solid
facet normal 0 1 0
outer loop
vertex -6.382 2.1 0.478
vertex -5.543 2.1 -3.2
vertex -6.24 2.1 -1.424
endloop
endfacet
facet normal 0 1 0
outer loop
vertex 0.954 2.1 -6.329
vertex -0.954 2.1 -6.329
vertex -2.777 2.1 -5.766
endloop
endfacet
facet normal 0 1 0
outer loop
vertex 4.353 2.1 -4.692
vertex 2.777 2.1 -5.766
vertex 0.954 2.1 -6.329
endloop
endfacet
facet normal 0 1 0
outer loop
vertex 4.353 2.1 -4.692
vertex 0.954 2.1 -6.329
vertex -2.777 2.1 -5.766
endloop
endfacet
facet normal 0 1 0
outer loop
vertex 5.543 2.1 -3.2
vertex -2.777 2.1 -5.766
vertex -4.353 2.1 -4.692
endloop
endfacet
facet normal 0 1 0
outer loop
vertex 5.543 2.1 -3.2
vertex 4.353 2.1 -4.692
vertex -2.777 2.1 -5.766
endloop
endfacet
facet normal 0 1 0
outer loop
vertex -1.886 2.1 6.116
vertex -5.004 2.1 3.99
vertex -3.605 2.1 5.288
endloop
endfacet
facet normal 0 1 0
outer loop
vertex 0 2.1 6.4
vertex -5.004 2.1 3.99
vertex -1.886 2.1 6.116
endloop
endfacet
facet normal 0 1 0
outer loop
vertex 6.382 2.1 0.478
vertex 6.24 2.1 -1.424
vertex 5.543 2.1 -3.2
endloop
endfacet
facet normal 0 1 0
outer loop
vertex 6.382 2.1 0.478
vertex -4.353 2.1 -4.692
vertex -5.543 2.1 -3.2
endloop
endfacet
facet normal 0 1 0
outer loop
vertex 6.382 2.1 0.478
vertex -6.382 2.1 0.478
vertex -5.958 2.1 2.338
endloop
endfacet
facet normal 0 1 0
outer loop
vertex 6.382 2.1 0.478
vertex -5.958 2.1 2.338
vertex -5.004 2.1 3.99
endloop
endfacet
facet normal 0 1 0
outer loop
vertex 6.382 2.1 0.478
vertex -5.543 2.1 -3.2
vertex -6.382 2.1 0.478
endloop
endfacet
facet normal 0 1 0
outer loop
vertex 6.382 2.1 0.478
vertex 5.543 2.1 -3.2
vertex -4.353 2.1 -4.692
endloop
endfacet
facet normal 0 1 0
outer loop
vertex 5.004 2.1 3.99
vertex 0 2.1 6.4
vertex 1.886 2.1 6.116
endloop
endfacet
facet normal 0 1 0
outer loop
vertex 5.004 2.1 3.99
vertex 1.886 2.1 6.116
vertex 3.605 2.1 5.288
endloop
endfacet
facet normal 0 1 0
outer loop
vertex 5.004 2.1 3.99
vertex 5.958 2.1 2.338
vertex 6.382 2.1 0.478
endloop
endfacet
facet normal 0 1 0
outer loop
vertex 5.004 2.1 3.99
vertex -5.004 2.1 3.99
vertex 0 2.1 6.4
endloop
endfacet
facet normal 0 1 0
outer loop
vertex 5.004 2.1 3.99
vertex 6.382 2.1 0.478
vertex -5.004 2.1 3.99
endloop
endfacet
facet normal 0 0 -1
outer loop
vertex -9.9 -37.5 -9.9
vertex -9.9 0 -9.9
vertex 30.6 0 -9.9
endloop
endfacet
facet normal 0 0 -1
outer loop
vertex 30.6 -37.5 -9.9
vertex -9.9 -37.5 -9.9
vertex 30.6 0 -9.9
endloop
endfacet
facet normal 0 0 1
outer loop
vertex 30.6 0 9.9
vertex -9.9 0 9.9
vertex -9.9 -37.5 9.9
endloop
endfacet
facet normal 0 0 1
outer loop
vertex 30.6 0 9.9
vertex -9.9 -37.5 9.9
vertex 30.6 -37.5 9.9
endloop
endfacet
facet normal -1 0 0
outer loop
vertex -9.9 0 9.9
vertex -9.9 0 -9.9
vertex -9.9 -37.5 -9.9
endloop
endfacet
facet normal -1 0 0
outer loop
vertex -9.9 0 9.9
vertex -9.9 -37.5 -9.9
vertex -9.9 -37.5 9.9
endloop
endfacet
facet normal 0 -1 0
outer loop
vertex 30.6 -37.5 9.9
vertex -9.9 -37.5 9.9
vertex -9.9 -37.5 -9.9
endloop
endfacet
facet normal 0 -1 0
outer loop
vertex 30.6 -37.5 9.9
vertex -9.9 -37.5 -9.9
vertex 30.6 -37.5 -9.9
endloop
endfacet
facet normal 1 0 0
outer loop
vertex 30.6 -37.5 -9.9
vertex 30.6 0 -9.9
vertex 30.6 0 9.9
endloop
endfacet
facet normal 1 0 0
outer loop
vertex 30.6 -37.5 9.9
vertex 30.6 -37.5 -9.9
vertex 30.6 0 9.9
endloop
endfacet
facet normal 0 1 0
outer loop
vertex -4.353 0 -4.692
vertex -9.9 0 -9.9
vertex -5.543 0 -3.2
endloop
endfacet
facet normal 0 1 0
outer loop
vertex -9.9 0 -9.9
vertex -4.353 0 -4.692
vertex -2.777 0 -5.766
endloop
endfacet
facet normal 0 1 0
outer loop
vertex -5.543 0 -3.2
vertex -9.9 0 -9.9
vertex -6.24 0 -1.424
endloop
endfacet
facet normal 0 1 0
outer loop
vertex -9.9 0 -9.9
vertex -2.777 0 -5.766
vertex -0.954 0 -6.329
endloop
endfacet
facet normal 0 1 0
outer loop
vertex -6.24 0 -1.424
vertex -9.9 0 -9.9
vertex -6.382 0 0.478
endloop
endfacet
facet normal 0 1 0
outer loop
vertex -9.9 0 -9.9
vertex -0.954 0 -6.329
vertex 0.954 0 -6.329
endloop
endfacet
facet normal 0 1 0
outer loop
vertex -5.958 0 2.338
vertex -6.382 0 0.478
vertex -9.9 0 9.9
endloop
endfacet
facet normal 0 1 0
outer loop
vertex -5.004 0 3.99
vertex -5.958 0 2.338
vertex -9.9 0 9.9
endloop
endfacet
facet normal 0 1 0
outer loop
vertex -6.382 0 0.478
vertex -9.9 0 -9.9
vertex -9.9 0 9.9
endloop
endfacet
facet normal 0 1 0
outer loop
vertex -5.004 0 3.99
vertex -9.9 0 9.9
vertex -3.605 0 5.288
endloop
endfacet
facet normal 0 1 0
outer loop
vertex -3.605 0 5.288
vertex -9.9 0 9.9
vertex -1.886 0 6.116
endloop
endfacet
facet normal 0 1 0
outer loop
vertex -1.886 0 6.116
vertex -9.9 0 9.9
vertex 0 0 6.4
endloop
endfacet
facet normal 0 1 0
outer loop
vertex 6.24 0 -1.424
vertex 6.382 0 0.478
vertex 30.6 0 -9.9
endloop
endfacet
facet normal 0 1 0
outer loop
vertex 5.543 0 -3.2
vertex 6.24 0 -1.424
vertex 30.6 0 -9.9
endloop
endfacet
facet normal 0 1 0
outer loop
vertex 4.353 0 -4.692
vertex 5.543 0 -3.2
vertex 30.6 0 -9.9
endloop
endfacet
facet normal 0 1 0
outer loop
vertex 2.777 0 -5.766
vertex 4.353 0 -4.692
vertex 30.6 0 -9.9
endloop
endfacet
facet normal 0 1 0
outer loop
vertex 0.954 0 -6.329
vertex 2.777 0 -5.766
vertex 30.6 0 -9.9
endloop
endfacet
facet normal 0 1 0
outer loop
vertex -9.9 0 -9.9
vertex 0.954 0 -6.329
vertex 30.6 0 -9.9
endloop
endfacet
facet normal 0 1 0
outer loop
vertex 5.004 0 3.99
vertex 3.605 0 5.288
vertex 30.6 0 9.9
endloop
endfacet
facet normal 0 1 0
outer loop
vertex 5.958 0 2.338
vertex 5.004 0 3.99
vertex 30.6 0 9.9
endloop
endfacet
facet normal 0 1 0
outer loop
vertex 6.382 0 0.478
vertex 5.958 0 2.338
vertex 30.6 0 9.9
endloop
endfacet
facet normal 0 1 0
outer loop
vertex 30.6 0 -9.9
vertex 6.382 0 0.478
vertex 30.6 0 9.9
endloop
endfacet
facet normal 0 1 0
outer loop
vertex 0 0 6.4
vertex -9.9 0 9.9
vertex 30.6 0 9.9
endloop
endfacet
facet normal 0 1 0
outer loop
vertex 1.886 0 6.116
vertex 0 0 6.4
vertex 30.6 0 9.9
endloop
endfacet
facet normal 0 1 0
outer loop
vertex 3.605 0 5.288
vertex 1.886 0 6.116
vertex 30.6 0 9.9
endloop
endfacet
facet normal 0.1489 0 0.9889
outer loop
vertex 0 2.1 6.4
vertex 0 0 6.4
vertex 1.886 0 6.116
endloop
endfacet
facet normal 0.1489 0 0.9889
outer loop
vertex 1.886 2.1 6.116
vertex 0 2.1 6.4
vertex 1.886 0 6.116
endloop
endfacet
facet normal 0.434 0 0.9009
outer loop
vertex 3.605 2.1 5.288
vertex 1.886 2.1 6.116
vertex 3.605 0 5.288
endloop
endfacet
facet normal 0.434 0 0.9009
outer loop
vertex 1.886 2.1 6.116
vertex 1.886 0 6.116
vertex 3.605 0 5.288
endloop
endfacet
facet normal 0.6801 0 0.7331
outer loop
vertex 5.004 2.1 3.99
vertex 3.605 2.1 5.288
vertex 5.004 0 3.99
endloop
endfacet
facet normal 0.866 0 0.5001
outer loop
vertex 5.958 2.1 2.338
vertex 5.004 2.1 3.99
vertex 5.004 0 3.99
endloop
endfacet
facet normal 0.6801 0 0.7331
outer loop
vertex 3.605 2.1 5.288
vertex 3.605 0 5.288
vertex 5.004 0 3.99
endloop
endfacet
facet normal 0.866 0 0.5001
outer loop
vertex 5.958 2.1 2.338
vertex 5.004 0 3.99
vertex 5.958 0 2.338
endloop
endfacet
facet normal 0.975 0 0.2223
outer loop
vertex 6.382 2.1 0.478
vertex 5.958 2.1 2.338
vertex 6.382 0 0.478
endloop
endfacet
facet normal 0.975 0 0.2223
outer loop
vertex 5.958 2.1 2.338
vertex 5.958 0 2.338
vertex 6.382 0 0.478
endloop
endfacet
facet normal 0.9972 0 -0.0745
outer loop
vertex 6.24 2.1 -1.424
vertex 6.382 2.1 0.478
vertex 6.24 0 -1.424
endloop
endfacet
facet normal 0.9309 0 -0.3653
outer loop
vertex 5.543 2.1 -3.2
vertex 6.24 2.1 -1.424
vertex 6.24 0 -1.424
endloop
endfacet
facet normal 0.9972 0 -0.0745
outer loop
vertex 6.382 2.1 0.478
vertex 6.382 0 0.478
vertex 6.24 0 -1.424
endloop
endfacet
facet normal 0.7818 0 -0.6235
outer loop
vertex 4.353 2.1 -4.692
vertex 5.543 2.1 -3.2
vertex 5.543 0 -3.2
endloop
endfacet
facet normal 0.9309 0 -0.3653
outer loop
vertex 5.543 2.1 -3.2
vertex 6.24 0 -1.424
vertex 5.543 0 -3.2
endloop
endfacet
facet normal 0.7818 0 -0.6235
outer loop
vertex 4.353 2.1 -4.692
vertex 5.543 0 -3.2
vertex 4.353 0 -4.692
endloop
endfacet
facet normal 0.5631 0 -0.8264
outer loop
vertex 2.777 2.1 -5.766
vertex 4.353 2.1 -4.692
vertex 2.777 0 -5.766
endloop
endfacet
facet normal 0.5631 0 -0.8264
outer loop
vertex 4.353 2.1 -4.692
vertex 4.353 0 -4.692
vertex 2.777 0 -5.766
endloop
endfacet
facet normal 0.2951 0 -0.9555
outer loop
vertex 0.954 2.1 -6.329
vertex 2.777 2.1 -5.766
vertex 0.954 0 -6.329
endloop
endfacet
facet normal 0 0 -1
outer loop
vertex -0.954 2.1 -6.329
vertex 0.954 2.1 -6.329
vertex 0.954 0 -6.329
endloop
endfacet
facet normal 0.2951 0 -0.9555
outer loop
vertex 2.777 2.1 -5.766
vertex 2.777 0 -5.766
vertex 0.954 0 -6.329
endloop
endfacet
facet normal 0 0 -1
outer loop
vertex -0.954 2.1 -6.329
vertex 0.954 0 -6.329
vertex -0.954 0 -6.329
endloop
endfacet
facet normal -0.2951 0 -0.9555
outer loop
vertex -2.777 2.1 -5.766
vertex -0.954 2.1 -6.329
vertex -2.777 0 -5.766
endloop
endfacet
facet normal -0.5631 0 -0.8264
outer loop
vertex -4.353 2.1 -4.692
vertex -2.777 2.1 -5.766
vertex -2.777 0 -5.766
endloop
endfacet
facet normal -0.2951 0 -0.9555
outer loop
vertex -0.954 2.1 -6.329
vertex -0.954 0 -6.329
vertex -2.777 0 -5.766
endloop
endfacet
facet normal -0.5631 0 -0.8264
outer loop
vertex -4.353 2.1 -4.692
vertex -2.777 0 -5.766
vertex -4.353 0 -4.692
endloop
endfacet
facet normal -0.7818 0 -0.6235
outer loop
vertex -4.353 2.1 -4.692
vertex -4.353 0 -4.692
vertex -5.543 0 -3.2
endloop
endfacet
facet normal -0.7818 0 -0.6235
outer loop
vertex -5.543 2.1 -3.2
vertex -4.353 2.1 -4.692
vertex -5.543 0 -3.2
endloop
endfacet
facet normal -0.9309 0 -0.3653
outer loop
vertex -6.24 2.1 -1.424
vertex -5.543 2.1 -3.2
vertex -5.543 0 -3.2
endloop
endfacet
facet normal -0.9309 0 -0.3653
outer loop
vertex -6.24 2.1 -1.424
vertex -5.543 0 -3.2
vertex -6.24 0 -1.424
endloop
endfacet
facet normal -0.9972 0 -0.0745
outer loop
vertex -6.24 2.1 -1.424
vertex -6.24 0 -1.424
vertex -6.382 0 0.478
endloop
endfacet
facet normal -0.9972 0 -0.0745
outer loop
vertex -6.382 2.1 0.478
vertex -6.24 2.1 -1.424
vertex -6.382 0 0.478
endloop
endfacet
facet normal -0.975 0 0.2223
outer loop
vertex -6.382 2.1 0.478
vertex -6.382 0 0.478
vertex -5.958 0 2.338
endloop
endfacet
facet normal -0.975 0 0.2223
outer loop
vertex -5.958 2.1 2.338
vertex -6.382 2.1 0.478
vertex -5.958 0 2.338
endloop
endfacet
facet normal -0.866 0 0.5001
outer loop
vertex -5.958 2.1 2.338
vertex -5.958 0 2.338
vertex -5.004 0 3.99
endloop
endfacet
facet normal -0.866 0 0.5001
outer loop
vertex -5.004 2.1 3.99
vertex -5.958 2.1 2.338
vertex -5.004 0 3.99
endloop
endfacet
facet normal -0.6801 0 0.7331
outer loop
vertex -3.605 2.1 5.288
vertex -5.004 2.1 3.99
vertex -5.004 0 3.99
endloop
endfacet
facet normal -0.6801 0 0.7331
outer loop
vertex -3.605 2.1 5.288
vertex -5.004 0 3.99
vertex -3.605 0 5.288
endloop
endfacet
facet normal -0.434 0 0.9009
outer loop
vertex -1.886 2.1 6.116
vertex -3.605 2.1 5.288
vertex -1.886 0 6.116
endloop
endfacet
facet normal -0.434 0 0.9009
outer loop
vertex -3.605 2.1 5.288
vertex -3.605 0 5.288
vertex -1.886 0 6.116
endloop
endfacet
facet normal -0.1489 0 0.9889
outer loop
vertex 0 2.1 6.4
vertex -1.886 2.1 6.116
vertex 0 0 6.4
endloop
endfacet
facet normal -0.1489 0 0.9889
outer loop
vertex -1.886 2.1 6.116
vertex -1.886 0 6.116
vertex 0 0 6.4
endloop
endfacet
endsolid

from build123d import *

# Parameters (mm, degrees)
SKETCH1_R           = 6.4
BOSS_EXTRUDE1_DEPTH = 2.1
SKETCH2_W           = 40.5
SKETCH2_H           = 19.8
BOSS_EXTRUDE2_DEPTH = 37.5


with BuildPart() as part:
    # Sketch1 → Boss-Extrude1 (new body)
    with BuildSketch(Plane(origin=(0, 0, 0), x_dir=(1, 0, 0), z_dir=(0, 1, 0))):
        Circle(SKETCH1_R)
    extrude(amount=BOSS_EXTRUDE1_DEPTH)

    # Sketch2 → Boss-Extrude2 (add)
    with BuildSketch(Plane.XZ):
        with Locations((10.35, 0)):
            Rectangle(SKETCH2_W, SKETCH2_H)
    extrude(amount=BOSS_EXTRUDE2_DEPTH)


solid = part.part
